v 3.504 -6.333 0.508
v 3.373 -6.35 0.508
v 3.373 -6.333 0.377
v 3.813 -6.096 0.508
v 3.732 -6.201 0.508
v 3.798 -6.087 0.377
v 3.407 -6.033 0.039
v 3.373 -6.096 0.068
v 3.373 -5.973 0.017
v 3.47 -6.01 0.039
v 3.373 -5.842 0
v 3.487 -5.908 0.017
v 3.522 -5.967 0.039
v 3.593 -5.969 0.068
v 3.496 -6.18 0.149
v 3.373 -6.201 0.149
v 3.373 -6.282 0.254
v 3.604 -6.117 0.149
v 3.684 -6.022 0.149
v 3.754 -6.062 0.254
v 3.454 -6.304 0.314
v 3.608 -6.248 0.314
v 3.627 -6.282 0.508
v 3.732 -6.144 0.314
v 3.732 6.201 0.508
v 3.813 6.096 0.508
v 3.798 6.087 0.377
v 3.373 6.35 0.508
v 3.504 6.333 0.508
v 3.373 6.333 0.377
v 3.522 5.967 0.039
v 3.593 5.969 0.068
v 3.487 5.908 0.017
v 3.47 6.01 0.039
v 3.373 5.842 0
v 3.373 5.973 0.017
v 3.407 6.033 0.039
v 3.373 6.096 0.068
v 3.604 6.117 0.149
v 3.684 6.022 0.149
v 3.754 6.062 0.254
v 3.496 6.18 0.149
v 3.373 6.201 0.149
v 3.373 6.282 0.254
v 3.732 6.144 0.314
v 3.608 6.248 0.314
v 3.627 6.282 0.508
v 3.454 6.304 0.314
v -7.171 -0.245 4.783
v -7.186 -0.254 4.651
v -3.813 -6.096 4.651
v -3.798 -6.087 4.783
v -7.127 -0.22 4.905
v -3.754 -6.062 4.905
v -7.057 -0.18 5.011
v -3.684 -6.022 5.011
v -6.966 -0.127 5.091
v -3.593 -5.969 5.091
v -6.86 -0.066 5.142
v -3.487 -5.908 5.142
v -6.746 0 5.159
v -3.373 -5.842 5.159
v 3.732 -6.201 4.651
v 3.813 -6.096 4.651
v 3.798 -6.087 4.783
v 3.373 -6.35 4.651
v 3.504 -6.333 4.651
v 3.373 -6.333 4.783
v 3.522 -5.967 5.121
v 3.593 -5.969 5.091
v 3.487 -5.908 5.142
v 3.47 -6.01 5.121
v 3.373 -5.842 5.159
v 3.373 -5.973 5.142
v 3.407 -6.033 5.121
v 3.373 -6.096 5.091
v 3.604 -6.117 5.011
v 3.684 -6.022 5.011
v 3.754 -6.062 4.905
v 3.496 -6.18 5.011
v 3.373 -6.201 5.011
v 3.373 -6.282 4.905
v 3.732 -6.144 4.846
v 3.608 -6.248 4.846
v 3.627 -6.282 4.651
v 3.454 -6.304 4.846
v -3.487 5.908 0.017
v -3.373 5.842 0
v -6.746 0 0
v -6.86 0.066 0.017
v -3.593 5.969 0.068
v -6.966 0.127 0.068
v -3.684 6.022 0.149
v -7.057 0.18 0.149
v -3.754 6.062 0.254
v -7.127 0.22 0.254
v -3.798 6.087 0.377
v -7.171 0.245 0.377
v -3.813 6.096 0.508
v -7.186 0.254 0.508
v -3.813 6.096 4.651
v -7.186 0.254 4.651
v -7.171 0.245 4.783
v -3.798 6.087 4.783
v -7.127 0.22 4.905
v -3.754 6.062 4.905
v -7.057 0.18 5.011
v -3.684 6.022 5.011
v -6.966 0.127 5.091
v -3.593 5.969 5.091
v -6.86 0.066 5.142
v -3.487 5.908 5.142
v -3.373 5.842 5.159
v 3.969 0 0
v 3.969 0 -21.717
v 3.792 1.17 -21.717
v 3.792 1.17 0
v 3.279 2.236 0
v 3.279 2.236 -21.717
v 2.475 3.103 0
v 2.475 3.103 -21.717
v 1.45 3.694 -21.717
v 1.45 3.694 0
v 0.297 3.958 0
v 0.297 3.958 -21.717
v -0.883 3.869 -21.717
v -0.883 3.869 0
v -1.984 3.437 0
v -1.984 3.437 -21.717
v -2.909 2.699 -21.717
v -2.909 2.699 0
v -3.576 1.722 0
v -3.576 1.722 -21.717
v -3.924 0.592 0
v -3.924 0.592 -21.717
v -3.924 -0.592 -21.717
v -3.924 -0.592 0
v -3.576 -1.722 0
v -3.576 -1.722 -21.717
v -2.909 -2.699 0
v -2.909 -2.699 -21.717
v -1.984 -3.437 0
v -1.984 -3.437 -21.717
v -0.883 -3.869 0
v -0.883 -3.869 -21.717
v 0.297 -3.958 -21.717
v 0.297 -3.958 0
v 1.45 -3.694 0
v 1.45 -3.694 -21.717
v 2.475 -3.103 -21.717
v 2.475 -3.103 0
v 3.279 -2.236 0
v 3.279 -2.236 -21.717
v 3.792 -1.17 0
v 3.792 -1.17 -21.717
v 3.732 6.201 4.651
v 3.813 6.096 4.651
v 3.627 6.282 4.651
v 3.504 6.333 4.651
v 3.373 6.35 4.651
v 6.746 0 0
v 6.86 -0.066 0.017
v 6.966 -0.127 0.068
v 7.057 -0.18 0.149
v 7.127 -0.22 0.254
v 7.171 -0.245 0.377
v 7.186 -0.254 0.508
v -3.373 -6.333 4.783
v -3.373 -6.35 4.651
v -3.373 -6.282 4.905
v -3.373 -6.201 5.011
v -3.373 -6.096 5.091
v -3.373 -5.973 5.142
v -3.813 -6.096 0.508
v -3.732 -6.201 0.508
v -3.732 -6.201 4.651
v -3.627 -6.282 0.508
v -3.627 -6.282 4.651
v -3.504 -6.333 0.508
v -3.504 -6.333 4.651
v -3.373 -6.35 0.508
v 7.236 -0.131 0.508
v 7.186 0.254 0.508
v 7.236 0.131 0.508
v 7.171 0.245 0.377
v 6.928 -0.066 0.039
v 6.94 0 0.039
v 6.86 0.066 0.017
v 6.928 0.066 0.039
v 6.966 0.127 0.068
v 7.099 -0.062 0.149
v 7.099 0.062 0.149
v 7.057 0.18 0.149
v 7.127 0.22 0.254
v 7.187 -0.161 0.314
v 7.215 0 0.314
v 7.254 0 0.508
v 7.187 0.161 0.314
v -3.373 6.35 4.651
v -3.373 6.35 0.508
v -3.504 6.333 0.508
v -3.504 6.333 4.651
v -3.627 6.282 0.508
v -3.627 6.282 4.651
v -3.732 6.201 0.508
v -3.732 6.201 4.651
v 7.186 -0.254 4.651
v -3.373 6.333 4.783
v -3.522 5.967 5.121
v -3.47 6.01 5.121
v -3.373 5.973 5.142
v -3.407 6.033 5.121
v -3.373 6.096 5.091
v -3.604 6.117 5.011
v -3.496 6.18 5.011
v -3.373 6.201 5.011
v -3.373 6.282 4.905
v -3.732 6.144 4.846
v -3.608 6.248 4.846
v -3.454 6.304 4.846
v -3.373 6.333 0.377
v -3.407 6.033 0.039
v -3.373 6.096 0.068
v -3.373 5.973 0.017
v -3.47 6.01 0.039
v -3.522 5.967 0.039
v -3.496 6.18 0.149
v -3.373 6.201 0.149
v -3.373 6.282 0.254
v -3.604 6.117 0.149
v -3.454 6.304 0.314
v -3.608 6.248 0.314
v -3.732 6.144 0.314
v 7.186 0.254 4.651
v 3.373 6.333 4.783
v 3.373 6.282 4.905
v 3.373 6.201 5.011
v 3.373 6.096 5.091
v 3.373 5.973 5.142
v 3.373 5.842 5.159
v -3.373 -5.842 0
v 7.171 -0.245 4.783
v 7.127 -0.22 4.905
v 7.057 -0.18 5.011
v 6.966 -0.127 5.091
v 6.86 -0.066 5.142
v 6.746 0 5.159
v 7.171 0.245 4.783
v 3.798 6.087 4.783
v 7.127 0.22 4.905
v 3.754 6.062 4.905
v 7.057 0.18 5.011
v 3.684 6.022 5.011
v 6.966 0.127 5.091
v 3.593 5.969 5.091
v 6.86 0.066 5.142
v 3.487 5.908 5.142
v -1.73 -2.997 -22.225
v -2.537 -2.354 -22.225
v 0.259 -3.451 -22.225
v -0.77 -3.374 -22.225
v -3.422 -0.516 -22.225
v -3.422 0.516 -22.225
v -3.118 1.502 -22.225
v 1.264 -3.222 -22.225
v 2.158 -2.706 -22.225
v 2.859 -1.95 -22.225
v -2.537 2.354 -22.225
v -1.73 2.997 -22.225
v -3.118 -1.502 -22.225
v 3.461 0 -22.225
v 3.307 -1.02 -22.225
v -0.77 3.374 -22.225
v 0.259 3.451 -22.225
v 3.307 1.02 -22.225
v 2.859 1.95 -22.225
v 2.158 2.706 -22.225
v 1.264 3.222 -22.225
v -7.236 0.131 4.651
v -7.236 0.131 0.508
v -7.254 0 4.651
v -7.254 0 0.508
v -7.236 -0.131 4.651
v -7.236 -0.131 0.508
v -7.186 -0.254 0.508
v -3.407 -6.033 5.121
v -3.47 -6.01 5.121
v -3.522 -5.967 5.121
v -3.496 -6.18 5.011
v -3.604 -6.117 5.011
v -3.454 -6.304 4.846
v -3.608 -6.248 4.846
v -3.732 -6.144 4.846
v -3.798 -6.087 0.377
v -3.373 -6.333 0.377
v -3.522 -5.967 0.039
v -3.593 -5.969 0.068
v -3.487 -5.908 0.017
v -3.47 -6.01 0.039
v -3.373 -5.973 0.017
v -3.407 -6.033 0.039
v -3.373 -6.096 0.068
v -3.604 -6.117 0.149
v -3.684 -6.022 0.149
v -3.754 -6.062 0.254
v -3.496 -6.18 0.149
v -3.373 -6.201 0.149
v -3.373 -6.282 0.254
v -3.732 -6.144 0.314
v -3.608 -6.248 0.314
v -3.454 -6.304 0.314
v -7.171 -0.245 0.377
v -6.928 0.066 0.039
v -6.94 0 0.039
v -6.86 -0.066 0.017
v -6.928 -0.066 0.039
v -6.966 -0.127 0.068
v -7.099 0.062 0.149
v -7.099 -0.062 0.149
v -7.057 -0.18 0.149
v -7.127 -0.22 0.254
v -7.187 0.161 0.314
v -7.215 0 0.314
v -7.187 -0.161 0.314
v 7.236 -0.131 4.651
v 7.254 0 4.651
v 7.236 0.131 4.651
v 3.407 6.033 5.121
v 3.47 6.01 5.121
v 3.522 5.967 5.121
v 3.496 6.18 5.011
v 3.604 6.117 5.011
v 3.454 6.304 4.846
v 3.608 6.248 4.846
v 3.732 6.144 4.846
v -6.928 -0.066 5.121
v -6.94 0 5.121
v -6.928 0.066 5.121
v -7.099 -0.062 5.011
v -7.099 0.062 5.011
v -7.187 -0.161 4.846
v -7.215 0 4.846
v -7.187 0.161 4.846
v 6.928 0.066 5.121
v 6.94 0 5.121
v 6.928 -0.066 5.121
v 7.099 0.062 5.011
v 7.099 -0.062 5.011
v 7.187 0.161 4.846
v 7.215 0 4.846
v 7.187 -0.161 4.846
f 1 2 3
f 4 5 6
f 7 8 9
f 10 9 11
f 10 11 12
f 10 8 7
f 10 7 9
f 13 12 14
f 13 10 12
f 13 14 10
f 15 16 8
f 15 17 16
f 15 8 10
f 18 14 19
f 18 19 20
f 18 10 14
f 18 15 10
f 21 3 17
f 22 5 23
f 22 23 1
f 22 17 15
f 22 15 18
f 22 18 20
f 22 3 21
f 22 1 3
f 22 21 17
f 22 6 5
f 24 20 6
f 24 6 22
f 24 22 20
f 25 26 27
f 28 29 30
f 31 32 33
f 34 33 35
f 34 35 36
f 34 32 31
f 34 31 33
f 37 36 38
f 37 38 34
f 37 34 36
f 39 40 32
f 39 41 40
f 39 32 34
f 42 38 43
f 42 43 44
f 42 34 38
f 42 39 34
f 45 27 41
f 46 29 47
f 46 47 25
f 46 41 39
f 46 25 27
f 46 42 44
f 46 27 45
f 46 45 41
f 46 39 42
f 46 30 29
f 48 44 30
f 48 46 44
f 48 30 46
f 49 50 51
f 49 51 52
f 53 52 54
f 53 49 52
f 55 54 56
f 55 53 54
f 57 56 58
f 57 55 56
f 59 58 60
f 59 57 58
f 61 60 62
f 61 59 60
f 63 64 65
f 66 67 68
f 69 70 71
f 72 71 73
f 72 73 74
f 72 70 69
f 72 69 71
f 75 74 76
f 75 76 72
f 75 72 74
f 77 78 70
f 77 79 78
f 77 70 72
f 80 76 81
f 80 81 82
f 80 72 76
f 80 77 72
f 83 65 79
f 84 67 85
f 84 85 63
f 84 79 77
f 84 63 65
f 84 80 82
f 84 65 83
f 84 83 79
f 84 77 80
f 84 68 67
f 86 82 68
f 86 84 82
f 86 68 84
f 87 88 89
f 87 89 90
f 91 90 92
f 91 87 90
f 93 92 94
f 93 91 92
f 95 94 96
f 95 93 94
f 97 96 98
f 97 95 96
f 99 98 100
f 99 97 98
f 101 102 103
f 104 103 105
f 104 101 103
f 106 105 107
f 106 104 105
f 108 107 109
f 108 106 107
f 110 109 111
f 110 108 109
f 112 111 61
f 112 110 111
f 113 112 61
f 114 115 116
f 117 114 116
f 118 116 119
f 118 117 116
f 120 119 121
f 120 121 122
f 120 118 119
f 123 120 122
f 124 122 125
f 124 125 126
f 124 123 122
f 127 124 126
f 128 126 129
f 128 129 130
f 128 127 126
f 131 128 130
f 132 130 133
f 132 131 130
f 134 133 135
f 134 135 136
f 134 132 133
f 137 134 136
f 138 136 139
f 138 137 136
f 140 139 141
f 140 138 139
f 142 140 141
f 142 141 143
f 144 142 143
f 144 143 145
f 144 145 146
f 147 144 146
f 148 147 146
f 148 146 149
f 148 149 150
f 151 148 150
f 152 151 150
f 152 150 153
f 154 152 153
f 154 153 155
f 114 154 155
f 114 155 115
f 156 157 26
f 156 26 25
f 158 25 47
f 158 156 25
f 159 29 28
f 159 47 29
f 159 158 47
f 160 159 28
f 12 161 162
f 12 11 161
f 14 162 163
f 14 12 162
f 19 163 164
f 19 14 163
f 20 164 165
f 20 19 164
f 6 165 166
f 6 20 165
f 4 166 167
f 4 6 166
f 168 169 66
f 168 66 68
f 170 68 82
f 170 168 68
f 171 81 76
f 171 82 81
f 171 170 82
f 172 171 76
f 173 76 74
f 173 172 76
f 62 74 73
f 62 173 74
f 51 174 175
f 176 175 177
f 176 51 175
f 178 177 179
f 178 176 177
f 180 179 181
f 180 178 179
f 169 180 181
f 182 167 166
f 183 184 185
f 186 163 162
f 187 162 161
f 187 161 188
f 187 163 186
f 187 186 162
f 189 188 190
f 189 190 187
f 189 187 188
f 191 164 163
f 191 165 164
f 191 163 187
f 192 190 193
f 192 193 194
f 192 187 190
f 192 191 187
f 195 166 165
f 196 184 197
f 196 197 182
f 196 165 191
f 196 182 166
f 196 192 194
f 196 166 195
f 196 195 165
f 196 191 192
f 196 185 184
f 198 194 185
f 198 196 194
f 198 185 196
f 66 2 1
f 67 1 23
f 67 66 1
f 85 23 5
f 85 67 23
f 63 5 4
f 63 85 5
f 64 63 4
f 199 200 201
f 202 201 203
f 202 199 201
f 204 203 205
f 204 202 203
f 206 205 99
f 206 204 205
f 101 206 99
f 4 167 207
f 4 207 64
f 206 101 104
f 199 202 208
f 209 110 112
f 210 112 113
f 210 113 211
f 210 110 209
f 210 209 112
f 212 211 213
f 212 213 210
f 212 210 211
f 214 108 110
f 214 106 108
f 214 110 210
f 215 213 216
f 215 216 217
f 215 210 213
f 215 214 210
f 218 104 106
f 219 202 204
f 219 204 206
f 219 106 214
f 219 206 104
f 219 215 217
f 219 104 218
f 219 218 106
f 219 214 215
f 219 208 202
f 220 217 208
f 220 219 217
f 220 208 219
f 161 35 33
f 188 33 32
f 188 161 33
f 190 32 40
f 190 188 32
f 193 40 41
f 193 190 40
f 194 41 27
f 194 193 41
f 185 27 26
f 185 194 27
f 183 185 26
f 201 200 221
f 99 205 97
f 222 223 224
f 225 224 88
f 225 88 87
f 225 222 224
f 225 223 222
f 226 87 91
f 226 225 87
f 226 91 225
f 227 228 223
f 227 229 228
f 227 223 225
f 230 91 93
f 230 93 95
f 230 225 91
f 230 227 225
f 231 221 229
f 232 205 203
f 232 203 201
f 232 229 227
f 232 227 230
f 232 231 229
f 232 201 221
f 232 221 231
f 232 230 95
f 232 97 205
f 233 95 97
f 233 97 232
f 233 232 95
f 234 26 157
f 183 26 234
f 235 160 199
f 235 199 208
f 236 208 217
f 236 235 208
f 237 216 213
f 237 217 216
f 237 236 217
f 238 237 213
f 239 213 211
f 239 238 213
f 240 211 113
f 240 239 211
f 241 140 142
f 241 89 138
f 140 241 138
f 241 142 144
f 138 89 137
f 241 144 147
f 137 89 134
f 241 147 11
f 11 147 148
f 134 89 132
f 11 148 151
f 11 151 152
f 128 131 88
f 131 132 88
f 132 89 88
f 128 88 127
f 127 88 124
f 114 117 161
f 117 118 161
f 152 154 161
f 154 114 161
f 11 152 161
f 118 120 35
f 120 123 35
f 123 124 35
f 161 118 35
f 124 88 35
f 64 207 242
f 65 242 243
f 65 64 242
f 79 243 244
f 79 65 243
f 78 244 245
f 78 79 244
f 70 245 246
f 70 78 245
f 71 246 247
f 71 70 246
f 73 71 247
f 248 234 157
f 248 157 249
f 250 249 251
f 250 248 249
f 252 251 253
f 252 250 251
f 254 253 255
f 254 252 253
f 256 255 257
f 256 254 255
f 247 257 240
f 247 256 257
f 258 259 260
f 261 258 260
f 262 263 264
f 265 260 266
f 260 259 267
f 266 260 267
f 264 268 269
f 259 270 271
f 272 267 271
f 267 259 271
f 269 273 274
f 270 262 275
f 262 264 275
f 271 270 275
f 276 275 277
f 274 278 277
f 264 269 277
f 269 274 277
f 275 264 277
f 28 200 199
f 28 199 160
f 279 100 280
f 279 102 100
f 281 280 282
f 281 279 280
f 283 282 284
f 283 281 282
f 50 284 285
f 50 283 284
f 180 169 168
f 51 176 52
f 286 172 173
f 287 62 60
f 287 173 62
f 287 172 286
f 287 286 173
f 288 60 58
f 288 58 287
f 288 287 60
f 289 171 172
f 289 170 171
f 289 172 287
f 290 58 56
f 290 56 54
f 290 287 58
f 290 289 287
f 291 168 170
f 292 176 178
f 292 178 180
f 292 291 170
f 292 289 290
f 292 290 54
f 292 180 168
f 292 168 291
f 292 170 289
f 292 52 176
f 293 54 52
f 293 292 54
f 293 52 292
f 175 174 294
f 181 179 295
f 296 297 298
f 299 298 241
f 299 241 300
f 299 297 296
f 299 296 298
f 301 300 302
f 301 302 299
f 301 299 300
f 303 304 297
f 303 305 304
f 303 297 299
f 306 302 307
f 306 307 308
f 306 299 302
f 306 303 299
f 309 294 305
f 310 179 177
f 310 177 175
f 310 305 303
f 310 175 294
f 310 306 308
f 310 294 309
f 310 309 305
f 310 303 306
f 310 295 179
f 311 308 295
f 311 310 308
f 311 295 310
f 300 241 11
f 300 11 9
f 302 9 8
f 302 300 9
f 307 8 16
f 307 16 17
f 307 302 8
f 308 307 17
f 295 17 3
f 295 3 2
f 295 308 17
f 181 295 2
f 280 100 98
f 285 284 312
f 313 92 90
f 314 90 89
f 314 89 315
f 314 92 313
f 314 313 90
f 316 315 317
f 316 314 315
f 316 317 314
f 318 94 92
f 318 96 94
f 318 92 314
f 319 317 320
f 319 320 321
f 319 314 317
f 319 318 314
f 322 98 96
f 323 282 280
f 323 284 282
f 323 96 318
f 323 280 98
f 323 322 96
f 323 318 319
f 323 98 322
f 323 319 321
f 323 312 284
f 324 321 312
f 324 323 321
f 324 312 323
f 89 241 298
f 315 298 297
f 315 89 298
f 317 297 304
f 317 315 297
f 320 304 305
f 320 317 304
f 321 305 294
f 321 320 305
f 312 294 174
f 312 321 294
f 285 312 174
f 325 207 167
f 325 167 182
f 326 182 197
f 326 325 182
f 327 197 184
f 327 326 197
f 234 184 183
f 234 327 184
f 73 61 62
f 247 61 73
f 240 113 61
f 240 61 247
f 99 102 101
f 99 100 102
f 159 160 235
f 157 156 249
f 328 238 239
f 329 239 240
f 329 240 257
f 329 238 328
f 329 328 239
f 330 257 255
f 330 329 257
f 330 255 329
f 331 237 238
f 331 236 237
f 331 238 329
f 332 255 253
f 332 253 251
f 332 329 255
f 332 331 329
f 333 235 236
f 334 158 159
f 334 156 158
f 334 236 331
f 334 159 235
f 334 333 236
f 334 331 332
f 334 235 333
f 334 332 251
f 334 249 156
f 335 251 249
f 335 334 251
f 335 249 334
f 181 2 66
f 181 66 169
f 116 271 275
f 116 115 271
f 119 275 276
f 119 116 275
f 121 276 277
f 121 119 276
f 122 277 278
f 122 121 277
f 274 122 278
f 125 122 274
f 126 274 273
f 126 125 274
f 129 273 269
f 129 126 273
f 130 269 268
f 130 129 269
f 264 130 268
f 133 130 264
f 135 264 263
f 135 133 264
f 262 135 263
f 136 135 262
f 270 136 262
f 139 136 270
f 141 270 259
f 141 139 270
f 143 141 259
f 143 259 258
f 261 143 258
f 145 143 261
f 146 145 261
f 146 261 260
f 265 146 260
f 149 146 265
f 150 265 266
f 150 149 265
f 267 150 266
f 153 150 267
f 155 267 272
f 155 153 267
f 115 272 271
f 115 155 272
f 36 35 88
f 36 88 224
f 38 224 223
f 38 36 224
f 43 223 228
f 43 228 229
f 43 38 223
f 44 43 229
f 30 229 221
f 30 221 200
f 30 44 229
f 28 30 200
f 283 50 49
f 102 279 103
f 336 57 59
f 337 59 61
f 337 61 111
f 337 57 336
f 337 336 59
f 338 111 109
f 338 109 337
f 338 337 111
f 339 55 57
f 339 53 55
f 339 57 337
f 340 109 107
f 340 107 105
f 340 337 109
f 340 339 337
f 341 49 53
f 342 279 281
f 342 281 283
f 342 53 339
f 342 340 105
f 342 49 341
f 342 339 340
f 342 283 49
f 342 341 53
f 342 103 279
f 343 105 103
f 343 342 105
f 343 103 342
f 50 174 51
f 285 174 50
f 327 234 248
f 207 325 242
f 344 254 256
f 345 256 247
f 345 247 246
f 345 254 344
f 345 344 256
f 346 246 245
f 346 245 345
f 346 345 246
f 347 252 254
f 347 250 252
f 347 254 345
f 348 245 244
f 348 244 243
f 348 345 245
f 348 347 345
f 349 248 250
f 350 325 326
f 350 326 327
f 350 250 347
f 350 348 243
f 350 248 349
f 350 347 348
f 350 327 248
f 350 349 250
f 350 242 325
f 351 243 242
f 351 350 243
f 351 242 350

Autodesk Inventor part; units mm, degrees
ref_plane "YZ Plane" through (0, 0, 0) normal (1, 0, 0) x (0, 1, 0)
ref_plane "XZ Plane" through (0, 0, 0) normal (0, 1, 0) x (-1, 0, 0)
ref_plane "XY Plane" through (0, 0, 0) normal (0, 0, 1) x (1, 0, 0)
sketch "Sketch1" plane through (0, 0, 0) normal (0, 0, 1) x (1, 0, 0)
  circle A0 centre (0, 0) radius 3.9688
  dimension "d0" = 7.9375
extrude "Extrusion1" add sketch "Sketch1" against normal blind 22.225
sketch "Sketch2" plane through (0, 0, 0) normal (0, 0, 1) x (1, 0, 0)
  circle A0 centre (0, 0) radius 3.9687 projected
  line L0 (-7.3323, 0) -> (-3.6662, 6.35)
  line L1 (-3.6662, 6.35) -> (3.6662, 6.35)
  line L2 (3.6662, 6.35) -> (7.3323, 0)
  line L3 (7.3323, 0) -> (3.6662, -6.35)
  line L4 (3.6662, -6.35) -> (-3.6662, -6.35)
  line L5 (-3.6662, -6.35) -> (-7.3323, 0)
  dimension "d3" = 12.7
extrude "Extrusion2" add sketch "Sketch2" along normal blind 5.1594 contours A0 | L0 L1 L2 L3 L4 L5
thread "Thread1" size "5/16-18 UNC" class "2A" standard "ANSI Unified Screw Threads" full length
chamfer "Chamfer1" distance 0.508 angle 45 1 edges at (-3.9688, 0, -22.225)
fillet "Fillet1" radius 0.508 18 edges at (0, 6.35, 5.1594) (-5.4993, 3.175, 5.1594) (-5.4993, -3.175, 5.1594) (0, -6.35, 5.1594) (5.4993, -3.175, 5.1594) (5.4993, 3.175, 5.1594) (-5.4993, 3.175, 0) (0, 6.35, 0) (5.4993, 3.175, 0) (5.4993, -3.175, 0) (0, -6.35, 0) (-5.4993, -3.175, 0) (7.3323, 0, 2.5797) (3.6662, -6.35, 2.5797) (3.6662, 6.35, 2.5797) (-3.6662, -6.35, 2.5797) (-7.3323, 0, 2.5797) (-3.6662, 6.35, 2.5797)
properties part number "375 bolt x4" material "Steel"
